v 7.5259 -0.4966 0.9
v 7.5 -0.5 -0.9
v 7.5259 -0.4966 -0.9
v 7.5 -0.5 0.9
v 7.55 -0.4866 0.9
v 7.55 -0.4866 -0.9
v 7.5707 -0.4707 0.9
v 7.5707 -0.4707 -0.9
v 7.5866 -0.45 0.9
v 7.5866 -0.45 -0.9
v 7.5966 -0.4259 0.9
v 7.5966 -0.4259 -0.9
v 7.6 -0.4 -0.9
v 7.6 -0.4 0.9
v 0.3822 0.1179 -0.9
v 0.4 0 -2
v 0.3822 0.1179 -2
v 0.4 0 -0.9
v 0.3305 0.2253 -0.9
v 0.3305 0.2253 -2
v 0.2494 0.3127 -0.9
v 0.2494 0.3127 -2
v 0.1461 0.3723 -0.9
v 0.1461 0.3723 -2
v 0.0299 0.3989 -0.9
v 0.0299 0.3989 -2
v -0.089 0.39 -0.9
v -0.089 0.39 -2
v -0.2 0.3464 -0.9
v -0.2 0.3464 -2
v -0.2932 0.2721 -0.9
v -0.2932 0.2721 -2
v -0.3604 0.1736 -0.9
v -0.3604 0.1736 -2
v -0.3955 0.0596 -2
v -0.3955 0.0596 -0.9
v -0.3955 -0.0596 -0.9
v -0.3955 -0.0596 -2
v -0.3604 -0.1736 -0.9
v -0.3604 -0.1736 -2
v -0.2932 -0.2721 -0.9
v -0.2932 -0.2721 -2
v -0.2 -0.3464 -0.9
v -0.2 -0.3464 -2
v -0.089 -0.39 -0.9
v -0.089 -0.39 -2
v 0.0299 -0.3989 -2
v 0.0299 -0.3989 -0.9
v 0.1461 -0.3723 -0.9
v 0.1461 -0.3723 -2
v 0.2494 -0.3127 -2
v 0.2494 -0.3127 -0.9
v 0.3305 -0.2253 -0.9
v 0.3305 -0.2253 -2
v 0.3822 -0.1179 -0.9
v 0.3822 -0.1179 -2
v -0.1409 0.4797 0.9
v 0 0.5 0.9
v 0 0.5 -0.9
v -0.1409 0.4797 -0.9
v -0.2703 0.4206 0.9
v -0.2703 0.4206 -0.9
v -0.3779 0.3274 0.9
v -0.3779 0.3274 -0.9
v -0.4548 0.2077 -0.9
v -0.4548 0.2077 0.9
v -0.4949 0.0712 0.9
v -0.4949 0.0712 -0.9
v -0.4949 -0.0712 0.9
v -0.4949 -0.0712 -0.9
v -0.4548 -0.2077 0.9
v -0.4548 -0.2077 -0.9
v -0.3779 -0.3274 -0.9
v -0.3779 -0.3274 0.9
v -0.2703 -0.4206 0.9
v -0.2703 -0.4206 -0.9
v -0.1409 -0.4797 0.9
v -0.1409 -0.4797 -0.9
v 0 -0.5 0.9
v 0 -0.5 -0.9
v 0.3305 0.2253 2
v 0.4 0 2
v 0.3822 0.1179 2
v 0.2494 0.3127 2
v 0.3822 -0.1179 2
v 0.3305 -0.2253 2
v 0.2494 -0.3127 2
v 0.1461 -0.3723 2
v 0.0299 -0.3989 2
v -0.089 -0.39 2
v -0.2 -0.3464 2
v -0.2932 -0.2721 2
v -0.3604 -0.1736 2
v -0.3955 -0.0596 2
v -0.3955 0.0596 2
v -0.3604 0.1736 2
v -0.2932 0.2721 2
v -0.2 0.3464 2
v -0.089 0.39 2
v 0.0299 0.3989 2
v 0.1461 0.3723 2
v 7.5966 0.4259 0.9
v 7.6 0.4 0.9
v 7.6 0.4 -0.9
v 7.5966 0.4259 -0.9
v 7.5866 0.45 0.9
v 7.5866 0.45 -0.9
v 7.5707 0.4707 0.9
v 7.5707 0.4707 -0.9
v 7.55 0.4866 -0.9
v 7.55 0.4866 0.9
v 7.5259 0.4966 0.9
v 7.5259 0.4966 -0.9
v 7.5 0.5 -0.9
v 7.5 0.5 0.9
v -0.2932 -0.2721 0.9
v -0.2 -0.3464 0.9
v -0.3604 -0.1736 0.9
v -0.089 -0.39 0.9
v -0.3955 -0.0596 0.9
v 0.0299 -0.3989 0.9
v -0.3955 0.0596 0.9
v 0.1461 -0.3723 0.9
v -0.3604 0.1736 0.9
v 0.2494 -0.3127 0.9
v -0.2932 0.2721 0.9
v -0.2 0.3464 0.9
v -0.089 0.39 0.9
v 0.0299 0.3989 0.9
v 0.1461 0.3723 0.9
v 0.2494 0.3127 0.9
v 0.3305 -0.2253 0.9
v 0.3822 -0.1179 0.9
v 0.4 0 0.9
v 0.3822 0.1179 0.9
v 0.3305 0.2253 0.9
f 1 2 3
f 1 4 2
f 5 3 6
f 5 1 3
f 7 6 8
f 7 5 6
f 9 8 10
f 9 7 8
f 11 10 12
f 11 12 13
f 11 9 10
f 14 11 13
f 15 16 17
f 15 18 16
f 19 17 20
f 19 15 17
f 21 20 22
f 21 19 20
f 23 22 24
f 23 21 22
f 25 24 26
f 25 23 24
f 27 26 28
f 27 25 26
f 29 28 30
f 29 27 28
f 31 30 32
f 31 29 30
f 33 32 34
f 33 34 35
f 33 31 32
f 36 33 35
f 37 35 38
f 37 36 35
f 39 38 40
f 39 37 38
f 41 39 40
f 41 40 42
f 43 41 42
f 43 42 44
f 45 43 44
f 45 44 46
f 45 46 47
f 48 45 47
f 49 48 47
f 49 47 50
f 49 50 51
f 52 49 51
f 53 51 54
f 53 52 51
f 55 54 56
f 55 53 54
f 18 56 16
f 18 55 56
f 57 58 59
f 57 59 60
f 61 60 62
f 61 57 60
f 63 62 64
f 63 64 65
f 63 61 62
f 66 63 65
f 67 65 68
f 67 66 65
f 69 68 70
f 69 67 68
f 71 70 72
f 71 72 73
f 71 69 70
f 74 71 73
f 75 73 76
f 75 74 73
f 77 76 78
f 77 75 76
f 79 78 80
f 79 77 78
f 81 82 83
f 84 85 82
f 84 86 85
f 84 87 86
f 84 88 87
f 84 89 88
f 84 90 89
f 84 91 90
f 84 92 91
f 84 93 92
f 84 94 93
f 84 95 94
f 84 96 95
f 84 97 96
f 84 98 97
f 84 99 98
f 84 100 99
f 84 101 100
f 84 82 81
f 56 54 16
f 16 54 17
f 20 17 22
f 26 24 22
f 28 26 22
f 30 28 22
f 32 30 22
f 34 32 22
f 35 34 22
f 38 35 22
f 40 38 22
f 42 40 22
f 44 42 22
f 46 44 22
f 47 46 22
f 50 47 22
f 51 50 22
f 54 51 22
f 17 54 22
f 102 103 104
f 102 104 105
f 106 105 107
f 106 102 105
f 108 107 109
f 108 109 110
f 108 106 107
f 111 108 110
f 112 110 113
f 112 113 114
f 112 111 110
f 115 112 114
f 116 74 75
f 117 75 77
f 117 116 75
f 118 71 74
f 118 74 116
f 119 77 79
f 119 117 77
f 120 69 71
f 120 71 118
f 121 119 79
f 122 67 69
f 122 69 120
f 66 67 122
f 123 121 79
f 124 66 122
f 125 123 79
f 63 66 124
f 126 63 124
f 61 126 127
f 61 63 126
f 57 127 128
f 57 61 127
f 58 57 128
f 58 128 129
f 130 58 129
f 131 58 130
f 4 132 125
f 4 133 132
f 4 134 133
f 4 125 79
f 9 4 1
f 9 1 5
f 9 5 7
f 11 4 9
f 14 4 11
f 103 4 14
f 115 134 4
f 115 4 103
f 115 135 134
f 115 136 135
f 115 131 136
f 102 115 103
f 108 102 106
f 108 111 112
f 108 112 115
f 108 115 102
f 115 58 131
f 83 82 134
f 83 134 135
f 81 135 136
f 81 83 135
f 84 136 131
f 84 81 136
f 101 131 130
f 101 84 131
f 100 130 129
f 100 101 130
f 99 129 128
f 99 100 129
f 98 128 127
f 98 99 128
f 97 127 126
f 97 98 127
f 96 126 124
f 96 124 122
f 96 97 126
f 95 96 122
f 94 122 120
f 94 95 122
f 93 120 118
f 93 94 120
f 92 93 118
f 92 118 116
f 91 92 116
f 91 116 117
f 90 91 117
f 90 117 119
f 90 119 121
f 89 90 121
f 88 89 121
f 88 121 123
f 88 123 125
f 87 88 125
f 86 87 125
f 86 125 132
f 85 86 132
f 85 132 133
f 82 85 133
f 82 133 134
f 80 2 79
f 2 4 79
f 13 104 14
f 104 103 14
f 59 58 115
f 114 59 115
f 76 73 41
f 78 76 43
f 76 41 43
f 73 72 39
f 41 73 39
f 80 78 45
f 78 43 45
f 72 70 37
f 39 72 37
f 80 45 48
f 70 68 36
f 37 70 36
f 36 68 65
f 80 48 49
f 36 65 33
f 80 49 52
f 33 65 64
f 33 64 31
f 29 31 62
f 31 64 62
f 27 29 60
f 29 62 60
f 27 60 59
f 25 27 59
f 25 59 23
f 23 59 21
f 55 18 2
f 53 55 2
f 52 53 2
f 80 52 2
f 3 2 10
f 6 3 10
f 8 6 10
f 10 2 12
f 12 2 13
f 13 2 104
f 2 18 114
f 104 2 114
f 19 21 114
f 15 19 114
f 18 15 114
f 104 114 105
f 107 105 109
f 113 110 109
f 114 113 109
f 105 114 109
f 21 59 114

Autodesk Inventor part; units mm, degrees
ref_plane "YZ Plane" through (0, 0, 0) normal (1, 0, 0) x (0, 1, 0)
ref_plane "XZ Plane" through (0, 0, 0) normal (0, 1, 0) x (-1, 0, 0)
ref_plane "XY Plane" through (0, 0, 0) normal (0, 0, 1) x (1, 0, 0)
sketch "스케치1" plane through (0, 0, 0) normal (0, 0, 1) x (1, 0, 0)
  circle A0 centre (0, 0) radius 0.4
  circle A1 centre (0, 0) radius 0.5
  line L0 (0, 0.5) -> (7.6, 0.5)
  line L1 (7.6, 0.5) -> (7.6, -0.5)
  line L2 (7.6, -0.5) -> (0, -0.5)
  line L3 (0, -0.5) -> (0, 0.5)
  point P0 (0, -0.5)
  dimension "d1" = 1
  dimension "d0" = 0.8
  dimension "d2" = 1
  dimension "d7" = 7.6
extrude "돌출1" add sketch "스케치1" along normal mid plane 4 contours A0 L3 | L3 A0
extrude "돌출2" add sketch "스케치1" along normal mid plane 1.8 contours A0 L3 A1 | A0 L3 A1 | L0 L1 L2 A1
fillet "모깎기1" radius 0.1 2 edges at (7.6, 0.5, 0) (7.6, -0.5, 0)
properties part number "집게 고정"
